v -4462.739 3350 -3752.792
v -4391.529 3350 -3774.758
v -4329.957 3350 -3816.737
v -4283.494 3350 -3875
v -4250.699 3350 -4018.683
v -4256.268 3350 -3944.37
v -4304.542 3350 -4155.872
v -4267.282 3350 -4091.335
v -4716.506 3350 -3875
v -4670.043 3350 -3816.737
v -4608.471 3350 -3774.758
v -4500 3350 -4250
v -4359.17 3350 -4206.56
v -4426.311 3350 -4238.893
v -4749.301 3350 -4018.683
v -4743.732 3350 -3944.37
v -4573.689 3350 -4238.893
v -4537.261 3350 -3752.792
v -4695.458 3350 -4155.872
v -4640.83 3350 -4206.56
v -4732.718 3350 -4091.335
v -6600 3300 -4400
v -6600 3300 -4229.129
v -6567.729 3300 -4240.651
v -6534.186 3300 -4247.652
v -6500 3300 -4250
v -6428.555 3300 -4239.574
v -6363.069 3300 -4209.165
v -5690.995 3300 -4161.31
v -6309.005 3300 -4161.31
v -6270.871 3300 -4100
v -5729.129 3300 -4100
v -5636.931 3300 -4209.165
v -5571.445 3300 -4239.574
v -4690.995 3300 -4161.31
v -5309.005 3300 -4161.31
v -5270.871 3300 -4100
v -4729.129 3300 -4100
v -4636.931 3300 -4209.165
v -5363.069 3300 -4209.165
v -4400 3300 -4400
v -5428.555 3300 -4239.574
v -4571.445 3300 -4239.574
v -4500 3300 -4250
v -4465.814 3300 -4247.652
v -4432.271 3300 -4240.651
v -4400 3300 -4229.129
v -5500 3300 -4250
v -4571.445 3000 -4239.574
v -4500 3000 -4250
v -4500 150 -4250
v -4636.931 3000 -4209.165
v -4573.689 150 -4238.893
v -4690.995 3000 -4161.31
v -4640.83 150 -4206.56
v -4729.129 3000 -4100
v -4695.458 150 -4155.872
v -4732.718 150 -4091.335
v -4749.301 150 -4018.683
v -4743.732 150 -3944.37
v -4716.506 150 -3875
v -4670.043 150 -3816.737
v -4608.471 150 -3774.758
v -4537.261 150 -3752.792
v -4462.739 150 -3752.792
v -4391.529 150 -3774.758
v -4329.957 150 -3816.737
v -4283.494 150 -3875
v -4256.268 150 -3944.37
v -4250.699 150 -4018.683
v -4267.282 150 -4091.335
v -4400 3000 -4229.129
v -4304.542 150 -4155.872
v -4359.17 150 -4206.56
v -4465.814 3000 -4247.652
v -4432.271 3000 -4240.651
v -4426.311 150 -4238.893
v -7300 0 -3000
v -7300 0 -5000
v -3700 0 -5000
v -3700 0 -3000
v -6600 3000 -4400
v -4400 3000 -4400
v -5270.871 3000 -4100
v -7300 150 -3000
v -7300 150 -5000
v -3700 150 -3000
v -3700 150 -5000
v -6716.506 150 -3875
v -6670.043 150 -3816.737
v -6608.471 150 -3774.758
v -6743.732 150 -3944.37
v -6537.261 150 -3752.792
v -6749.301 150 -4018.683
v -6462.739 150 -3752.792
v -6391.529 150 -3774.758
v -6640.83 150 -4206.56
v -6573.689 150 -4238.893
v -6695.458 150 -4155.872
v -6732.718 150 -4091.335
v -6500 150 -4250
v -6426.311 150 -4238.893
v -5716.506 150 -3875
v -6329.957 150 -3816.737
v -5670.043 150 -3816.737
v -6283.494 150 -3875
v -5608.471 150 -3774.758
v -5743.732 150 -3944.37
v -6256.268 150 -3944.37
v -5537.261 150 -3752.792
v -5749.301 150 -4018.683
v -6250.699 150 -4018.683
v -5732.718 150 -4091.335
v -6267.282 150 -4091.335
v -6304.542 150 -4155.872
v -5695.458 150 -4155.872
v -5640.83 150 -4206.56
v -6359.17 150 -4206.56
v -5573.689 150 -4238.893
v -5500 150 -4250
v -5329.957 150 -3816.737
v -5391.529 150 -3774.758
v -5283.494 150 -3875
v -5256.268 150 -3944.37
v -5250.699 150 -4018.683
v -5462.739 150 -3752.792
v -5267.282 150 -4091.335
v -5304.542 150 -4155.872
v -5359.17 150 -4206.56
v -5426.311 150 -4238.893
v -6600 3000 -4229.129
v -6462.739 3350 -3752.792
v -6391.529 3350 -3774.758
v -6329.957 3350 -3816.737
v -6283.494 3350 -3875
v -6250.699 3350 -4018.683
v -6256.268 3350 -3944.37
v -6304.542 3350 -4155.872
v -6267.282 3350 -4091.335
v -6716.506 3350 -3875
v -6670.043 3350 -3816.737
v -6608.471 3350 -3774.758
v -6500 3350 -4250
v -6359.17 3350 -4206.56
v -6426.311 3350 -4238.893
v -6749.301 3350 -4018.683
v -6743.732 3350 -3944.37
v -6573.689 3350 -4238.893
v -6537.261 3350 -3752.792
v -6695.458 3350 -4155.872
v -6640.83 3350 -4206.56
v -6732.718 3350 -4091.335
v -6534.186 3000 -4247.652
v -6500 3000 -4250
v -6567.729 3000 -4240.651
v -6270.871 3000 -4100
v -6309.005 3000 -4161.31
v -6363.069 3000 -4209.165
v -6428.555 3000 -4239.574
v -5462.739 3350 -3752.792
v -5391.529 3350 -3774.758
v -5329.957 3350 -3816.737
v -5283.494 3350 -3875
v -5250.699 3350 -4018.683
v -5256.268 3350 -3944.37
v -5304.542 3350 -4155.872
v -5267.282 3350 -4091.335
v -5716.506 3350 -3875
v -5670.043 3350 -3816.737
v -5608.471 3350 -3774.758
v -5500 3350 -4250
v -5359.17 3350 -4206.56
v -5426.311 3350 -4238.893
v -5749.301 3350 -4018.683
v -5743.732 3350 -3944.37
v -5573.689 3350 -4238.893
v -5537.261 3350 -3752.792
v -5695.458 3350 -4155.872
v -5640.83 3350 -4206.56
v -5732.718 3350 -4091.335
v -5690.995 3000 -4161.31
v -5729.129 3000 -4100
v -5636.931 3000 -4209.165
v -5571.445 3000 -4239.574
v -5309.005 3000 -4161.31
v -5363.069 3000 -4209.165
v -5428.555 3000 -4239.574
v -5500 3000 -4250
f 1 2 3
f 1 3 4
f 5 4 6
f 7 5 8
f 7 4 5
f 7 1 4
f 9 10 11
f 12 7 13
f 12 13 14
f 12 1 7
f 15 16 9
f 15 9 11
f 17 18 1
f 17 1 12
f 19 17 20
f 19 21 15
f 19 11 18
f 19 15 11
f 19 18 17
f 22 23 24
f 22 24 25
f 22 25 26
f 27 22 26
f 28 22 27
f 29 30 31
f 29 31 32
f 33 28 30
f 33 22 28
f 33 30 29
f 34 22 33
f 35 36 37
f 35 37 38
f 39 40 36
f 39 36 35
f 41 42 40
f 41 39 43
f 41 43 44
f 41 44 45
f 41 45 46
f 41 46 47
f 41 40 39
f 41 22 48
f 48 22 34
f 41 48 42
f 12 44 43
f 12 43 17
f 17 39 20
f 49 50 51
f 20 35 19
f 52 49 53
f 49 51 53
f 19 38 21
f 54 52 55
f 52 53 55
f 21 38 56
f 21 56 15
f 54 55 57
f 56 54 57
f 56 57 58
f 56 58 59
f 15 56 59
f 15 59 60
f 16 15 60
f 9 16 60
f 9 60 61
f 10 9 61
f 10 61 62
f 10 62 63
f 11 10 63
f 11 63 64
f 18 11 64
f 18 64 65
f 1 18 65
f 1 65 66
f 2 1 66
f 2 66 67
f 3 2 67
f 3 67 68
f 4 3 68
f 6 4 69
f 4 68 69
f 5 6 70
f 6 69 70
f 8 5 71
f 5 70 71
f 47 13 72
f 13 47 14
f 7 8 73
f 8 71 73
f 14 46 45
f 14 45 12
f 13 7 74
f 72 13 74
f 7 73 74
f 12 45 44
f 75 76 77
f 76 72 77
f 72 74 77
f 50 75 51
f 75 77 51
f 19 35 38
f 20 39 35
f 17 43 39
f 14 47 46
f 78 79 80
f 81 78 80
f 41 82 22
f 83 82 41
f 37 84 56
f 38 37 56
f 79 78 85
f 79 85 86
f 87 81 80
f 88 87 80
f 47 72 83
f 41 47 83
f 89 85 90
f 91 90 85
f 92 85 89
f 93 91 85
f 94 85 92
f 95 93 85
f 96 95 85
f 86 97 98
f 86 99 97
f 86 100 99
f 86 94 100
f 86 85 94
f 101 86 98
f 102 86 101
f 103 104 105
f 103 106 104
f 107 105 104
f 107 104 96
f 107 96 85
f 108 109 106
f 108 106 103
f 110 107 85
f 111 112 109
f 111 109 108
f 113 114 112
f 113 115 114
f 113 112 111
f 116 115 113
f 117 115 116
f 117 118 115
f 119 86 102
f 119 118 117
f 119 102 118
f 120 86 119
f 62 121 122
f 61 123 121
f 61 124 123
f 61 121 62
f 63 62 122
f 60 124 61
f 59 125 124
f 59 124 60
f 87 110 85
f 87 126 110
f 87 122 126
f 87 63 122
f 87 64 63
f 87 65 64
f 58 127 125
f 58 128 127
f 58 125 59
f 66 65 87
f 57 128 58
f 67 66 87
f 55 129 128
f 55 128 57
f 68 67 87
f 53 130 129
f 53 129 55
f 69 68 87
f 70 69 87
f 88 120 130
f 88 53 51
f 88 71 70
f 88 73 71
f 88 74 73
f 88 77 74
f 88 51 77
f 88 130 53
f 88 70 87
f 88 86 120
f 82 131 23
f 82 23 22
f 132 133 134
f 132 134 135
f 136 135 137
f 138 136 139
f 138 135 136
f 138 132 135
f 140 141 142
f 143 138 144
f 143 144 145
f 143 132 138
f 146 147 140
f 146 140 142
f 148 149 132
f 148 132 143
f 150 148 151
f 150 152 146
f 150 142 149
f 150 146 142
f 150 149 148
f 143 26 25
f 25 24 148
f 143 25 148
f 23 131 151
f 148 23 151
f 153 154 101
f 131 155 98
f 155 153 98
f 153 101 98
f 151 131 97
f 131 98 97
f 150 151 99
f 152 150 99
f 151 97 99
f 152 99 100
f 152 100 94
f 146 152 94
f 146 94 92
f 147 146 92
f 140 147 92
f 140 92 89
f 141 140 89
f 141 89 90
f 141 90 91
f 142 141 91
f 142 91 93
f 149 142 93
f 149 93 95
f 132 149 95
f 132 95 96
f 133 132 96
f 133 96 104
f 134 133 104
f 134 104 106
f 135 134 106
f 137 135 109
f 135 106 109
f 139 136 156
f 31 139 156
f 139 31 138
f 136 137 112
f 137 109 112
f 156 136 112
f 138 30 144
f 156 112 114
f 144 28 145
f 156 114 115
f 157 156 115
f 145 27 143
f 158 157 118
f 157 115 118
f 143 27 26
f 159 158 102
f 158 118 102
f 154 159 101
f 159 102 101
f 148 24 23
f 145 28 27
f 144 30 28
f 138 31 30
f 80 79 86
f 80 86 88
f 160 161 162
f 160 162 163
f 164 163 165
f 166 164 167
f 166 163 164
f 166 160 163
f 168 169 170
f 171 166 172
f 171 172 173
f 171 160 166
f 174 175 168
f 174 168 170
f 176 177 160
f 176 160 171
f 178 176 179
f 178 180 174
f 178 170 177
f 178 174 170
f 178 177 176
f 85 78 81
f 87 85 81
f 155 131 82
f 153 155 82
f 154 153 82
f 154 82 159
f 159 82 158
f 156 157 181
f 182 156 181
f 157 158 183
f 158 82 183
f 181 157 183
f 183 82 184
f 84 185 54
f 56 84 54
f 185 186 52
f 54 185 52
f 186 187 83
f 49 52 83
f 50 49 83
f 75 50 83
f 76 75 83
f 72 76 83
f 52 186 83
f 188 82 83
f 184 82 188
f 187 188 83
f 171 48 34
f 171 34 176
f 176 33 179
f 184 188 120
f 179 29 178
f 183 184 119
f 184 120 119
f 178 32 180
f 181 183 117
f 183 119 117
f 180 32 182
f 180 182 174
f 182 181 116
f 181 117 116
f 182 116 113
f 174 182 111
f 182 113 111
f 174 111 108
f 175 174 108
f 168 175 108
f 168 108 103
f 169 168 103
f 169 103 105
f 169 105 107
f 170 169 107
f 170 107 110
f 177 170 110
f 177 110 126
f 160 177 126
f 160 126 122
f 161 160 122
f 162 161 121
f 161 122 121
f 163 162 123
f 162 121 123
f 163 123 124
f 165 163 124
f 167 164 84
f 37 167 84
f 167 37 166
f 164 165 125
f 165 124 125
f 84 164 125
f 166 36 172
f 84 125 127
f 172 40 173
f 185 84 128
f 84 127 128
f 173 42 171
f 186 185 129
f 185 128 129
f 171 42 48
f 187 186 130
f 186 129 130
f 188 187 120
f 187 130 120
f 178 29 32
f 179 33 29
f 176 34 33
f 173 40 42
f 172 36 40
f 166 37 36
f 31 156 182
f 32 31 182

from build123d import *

# Parameters (mm, degrees)
SKETCH1_W           = 3600
SKETCH1_H           = 2000
BOSS_EXTRUDE1_DEPTH = 150
BOSS_EXTRUDE2_START = 150
SKETCH2_R           = 250
BOSS_EXTRUDE2_DEPTH = 3200
BOSS_EXTRUDE3_START = 150
SKETCH3_R           = 250
BOSS_EXTRUDE3_DEPTH = 3200
BOSS_EXTRUDE4_START = 150
SKETCH4_R           = 250
BOSS_EXTRUDE4_DEPTH = 3200
BOSS_EXTRUDE5_START = 3000
SKETCH5_W           = 2200
SKETCH5_H           = 300
BOSS_EXTRUDE5_DEPTH = 300


with BuildPart() as part:
    # Sketch1 → Boss-Extrude1 (new body)
    with BuildSketch(Plane(origin=(0, 0, 0), x_dir=(1, 0, 0), z_dir=(0, 1, 0))):
        with Locations((-5500, 4000)):
            Rectangle(SKETCH1_W, SKETCH1_H)
    extrude(amount=BOSS_EXTRUDE1_DEPTH)

    # Sketch2 → Boss-Extrude2 (add)
    with BuildSketch(Plane(origin=(0, 0, 0), x_dir=(1, 0, 0), z_dir=(0, 1, 0)).offset(BOSS_EXTRUDE2_START)):
        with Locations(Location((-6500, 4000, 0), (0, 0, 90))):
            Circle(SKETCH2_R)
    extrude(amount=BOSS_EXTRUDE2_DEPTH)

    # Sketch3 → Boss-Extrude3 (add)
    with BuildSketch(Plane(origin=(0, 0, 0), x_dir=(1, 0, 0), z_dir=(0, 1, 0)).offset(BOSS_EXTRUDE3_START)):
        with Locations(Location((-5500, 4000, 0), (0, 0, 90))):
            Circle(SKETCH3_R)
    extrude(amount=BOSS_EXTRUDE3_DEPTH)

    # Sketch4 → Boss-Extrude4 (add)
    with BuildSketch(Plane(origin=(0, 0, 0), x_dir=(1, 0, 0), z_dir=(0, 1, 0)).offset(BOSS_EXTRUDE4_START)):
        with Locations(Location((-4500, 4000, 0), (0, 0, 90))):
            Circle(SKETCH4_R)
    extrude(amount=BOSS_EXTRUDE4_DEPTH)

    # Sketch5 → Boss-Extrude5 (add)
    with BuildSketch(Plane(origin=(0, 0, 0), x_dir=(1, 0, 0), z_dir=(0, 1, 0)).offset(BOSS_EXTRUDE5_START)):
        with Locations((-5500, 4250)):
            Rectangle(SKETCH5_W, SKETCH5_H)
    extrude(amount=BOSS_EXTRUDE5_DEPTH)


solid = part.part
